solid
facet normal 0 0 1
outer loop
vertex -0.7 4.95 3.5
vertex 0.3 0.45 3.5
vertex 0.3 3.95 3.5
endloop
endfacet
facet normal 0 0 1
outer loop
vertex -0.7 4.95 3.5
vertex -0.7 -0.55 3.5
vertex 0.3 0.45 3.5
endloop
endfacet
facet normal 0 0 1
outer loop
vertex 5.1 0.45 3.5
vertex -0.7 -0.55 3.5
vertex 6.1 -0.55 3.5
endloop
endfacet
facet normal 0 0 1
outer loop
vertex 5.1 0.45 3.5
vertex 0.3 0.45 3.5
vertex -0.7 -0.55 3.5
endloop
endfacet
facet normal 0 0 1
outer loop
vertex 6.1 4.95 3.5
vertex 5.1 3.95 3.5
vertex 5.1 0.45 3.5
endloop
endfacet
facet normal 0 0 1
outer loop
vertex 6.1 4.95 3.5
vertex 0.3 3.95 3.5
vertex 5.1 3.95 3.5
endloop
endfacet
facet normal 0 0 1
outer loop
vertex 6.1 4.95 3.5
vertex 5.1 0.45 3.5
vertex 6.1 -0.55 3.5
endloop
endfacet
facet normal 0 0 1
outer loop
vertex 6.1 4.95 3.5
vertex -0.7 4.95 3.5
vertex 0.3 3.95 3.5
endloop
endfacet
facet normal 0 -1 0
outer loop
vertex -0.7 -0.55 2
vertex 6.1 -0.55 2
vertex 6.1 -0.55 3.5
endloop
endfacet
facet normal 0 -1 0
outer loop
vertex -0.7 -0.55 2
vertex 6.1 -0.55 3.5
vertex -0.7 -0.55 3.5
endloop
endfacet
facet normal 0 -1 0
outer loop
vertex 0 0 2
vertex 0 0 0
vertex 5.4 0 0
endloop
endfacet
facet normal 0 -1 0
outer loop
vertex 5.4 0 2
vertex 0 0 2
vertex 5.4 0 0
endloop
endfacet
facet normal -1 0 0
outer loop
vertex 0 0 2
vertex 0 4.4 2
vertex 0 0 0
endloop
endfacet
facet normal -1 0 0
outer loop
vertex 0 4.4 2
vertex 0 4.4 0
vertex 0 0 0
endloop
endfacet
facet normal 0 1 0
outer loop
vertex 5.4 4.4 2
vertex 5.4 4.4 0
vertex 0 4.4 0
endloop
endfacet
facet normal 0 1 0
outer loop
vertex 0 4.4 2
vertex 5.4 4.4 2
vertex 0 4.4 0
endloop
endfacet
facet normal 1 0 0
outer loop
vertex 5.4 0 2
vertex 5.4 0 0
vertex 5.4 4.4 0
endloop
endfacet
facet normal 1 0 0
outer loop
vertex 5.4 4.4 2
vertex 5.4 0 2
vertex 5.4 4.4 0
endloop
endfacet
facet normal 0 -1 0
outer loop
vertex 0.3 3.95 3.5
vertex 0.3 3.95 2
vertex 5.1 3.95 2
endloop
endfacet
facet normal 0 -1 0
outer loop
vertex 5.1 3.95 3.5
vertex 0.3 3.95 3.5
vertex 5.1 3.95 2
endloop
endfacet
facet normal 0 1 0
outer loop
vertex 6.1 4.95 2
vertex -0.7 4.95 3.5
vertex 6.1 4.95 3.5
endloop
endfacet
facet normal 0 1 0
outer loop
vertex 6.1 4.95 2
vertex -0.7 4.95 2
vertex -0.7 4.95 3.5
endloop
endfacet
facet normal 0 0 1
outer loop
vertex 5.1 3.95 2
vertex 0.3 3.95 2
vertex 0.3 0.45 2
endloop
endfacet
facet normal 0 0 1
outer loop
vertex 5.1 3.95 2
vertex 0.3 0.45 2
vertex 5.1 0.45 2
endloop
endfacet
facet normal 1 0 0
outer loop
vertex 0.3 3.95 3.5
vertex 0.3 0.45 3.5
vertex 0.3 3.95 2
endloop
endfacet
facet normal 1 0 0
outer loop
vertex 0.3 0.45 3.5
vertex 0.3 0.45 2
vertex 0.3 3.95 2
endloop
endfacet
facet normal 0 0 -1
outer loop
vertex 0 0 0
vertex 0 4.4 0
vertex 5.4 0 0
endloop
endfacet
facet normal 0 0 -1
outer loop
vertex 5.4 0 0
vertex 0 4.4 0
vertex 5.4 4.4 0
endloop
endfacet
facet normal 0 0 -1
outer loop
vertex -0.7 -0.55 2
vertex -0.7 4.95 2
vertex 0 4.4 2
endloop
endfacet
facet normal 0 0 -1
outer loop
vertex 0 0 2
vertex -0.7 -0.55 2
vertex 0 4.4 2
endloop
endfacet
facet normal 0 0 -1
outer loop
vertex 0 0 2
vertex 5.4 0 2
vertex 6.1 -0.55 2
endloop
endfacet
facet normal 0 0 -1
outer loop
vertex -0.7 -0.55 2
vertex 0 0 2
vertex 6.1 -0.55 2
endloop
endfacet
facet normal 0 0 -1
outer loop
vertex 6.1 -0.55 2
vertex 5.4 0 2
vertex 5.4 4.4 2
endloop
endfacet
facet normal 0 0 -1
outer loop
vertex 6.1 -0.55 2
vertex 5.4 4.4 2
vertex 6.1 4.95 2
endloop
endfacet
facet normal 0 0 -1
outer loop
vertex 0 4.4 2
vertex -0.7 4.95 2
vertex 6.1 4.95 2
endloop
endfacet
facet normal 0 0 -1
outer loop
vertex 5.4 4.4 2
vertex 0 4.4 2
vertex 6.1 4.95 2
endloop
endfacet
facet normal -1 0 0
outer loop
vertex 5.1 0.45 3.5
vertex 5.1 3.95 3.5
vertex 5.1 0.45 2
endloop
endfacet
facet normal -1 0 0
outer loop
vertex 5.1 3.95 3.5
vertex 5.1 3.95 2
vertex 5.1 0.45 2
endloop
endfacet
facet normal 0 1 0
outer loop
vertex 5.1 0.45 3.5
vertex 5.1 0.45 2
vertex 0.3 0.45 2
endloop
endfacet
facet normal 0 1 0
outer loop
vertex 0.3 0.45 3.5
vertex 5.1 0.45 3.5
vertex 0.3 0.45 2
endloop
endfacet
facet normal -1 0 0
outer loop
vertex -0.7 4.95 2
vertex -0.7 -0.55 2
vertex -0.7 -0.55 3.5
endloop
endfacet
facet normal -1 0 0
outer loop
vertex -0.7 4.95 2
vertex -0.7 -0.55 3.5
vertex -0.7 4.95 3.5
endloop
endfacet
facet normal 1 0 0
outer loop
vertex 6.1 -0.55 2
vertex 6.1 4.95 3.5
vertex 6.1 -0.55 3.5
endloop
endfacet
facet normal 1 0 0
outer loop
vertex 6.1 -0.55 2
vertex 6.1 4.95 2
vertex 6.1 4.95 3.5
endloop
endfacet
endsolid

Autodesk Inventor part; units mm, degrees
ref_plane "YZ Plane" through (0, 0, 0) normal (1, 0, 0) x (0, 1, 0)
ref_plane "XZ Plane" through (0, 0, 0) normal (0, 1, 0) x (-1, 0, 0)
ref_plane "XY Plane" through (0, 0, 0) normal (0, 0, 1) x (1, 0, 0)
sketch "Эскиз1" plane through (0, 0, 0) normal (0, 0, 1) x (1, 0, 0)
  line L0 (0, 0) -> (5.4, 0)
  line L1 (5.4, 0) -> (5.4, 4.4)
  line L2 (5.4, 4.4) -> (0, 4.4)
  line L3 (0, 4.4) -> (0, 0)
  dimension "d0" = 5.4
  dimension "d1" = 4.4
extrude "Выдавливание1" add sketch "Эскиз1" along normal blind 2
sketch "Эскиз2" plane through (0, 0, 2) normal (0, 0, 1) x (1, 0, 0)
  line L0 (0, 0) -> (5.4, 0) projected
  line L1 (5.4, 0) -> (5.4, 4.4) projected
  line L2 (5.4, 4.4) -> (0, 4.4) projected
  line L3 (0, 4.4) -> (0, 0) projected
  line L4 (0.3, 3.95) -> (5.1, 3.95)
  line L5 (5.1, 3.95) -> (5.1, 0.45)
  line L6 (5.1, 0.45) -> (0.3, 0.45)
  line L7 (0.3, 0.45) -> (0.3, 3.95)
  line L8 (-0.7, 4.95) -> (6.1, 4.95)
  line L9 (6.1, 4.95) -> (6.1, -0.55)
  line L10 (6.1, -0.55) -> (-0.7, -0.55)
  line L11 (-0.7, -0.55) -> (-0.7, 4.95)
  dimension "d4" = 4.8
  dimension "d5" = 3.5
  dimension "d6" = 5.4
  dimension "d7" = 4.4
  dimension "d8" = 0.3
  dimension "d9" = 0.45
  dimension "d12" = 1
  dimension "d13" = 1
  dimension "d14" = 1
  dimension "d15" = 1
extrude "Выдавливание3" add sketch "Эскиз2" along normal blind 1.5 contours L3 L2 L1 L0 | L8 L9 L10 L11
equation "\"d8\" = -0.5 * d4 + 0.5 * d6"
equation "\"d9\" = -0.5 * d5 + 0.5 * d7"
equation "\"d13\" = d12"
equation "\"d14\" = d12"
equation "\"d15\" = d12"
properties part number "button"
